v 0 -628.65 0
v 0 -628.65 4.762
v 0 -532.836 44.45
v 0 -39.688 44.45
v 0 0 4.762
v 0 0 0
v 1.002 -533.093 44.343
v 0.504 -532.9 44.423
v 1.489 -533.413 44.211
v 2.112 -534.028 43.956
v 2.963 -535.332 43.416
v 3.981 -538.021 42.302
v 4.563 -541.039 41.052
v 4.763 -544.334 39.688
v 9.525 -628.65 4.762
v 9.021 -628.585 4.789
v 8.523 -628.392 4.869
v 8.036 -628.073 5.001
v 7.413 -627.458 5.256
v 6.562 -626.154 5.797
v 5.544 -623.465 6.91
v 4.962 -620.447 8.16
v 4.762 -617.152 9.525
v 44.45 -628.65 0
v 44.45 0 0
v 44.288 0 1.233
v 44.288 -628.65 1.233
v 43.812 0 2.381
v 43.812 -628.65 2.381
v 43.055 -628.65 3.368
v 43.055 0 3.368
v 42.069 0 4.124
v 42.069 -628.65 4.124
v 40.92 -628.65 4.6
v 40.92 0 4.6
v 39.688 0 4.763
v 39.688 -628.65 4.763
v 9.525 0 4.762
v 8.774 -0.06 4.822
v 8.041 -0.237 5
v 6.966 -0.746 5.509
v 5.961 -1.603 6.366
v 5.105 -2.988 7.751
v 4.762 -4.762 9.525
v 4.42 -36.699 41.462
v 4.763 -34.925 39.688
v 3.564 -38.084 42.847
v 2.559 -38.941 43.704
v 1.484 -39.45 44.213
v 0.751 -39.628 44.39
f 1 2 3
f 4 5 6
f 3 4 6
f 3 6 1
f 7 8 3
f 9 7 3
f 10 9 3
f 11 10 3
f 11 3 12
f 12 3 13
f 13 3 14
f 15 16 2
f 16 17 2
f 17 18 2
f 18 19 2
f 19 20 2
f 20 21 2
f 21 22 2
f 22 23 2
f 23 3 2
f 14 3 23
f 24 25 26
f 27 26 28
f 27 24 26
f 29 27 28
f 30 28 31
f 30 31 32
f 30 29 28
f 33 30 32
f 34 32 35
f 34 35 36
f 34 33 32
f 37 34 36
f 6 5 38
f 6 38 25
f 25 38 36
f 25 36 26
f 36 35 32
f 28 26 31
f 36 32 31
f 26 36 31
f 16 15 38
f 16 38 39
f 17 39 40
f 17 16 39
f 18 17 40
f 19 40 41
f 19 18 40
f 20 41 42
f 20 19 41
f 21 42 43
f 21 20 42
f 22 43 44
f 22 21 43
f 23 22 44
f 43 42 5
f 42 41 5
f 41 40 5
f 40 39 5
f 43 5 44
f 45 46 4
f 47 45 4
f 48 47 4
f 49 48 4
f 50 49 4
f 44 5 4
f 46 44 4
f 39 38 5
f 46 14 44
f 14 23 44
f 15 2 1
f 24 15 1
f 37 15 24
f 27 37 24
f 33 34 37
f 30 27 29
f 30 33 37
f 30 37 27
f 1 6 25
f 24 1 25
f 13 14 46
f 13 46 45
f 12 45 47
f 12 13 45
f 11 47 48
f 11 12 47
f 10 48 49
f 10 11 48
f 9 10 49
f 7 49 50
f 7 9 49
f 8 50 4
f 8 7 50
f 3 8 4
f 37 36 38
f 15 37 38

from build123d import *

# Parameters (mm, degrees)
F1_DEPTH = 628.65
F2_R     = 4.76249
F4_DEPTH = 25.4


# Not quite as in the source:
# - a fillet or chamfer is up to 0.001 mm smaller than in the source, because OpenCascade refuses the exact size


with BuildPart() as f1:
    # F0 (on Front) → F1 (new body)
    with BuildSketch(Plane.XZ):
        Polygon((0, 44.45), (0, 0), (44.45, 0), (44.45, 4.7625), (4.7625, 4.7625), (4.7625, 44.45), align=None)
    extrude(amount=F1_DEPTH)

    # F2 (radius 4.7625 in the source; OpenCascade refuses exactly that, so slightly less here)
    f2_edges = [f1.edges().sort_by_distance(p)[0] for p in [
        (4.7625, -314.325, 4.7625),
        (4.7625, -314.325, 44.45),
        (44.45, -314.325, 4.7625),
    ]]
    fillet(f2_edges, radius=F2_R)

    # F3 (on face) → F4 (cut)
    with BuildSketch(Plane(origin=(0, 0, 0), x_dir=(0, -1, 0), z_dir=(-1, 0, 0))):
        Polygon((0, 44.45), (0, 4.7625), (39.6875, 44.45), align=None)
        Polygon((628.65, 44.45), (532.8358992433, 44.45), (628.65, 4.7625), align=None)
    extrude(amount=-F4_DEPTH, mode=Mode.SUBTRACT)


solid = f1.part
